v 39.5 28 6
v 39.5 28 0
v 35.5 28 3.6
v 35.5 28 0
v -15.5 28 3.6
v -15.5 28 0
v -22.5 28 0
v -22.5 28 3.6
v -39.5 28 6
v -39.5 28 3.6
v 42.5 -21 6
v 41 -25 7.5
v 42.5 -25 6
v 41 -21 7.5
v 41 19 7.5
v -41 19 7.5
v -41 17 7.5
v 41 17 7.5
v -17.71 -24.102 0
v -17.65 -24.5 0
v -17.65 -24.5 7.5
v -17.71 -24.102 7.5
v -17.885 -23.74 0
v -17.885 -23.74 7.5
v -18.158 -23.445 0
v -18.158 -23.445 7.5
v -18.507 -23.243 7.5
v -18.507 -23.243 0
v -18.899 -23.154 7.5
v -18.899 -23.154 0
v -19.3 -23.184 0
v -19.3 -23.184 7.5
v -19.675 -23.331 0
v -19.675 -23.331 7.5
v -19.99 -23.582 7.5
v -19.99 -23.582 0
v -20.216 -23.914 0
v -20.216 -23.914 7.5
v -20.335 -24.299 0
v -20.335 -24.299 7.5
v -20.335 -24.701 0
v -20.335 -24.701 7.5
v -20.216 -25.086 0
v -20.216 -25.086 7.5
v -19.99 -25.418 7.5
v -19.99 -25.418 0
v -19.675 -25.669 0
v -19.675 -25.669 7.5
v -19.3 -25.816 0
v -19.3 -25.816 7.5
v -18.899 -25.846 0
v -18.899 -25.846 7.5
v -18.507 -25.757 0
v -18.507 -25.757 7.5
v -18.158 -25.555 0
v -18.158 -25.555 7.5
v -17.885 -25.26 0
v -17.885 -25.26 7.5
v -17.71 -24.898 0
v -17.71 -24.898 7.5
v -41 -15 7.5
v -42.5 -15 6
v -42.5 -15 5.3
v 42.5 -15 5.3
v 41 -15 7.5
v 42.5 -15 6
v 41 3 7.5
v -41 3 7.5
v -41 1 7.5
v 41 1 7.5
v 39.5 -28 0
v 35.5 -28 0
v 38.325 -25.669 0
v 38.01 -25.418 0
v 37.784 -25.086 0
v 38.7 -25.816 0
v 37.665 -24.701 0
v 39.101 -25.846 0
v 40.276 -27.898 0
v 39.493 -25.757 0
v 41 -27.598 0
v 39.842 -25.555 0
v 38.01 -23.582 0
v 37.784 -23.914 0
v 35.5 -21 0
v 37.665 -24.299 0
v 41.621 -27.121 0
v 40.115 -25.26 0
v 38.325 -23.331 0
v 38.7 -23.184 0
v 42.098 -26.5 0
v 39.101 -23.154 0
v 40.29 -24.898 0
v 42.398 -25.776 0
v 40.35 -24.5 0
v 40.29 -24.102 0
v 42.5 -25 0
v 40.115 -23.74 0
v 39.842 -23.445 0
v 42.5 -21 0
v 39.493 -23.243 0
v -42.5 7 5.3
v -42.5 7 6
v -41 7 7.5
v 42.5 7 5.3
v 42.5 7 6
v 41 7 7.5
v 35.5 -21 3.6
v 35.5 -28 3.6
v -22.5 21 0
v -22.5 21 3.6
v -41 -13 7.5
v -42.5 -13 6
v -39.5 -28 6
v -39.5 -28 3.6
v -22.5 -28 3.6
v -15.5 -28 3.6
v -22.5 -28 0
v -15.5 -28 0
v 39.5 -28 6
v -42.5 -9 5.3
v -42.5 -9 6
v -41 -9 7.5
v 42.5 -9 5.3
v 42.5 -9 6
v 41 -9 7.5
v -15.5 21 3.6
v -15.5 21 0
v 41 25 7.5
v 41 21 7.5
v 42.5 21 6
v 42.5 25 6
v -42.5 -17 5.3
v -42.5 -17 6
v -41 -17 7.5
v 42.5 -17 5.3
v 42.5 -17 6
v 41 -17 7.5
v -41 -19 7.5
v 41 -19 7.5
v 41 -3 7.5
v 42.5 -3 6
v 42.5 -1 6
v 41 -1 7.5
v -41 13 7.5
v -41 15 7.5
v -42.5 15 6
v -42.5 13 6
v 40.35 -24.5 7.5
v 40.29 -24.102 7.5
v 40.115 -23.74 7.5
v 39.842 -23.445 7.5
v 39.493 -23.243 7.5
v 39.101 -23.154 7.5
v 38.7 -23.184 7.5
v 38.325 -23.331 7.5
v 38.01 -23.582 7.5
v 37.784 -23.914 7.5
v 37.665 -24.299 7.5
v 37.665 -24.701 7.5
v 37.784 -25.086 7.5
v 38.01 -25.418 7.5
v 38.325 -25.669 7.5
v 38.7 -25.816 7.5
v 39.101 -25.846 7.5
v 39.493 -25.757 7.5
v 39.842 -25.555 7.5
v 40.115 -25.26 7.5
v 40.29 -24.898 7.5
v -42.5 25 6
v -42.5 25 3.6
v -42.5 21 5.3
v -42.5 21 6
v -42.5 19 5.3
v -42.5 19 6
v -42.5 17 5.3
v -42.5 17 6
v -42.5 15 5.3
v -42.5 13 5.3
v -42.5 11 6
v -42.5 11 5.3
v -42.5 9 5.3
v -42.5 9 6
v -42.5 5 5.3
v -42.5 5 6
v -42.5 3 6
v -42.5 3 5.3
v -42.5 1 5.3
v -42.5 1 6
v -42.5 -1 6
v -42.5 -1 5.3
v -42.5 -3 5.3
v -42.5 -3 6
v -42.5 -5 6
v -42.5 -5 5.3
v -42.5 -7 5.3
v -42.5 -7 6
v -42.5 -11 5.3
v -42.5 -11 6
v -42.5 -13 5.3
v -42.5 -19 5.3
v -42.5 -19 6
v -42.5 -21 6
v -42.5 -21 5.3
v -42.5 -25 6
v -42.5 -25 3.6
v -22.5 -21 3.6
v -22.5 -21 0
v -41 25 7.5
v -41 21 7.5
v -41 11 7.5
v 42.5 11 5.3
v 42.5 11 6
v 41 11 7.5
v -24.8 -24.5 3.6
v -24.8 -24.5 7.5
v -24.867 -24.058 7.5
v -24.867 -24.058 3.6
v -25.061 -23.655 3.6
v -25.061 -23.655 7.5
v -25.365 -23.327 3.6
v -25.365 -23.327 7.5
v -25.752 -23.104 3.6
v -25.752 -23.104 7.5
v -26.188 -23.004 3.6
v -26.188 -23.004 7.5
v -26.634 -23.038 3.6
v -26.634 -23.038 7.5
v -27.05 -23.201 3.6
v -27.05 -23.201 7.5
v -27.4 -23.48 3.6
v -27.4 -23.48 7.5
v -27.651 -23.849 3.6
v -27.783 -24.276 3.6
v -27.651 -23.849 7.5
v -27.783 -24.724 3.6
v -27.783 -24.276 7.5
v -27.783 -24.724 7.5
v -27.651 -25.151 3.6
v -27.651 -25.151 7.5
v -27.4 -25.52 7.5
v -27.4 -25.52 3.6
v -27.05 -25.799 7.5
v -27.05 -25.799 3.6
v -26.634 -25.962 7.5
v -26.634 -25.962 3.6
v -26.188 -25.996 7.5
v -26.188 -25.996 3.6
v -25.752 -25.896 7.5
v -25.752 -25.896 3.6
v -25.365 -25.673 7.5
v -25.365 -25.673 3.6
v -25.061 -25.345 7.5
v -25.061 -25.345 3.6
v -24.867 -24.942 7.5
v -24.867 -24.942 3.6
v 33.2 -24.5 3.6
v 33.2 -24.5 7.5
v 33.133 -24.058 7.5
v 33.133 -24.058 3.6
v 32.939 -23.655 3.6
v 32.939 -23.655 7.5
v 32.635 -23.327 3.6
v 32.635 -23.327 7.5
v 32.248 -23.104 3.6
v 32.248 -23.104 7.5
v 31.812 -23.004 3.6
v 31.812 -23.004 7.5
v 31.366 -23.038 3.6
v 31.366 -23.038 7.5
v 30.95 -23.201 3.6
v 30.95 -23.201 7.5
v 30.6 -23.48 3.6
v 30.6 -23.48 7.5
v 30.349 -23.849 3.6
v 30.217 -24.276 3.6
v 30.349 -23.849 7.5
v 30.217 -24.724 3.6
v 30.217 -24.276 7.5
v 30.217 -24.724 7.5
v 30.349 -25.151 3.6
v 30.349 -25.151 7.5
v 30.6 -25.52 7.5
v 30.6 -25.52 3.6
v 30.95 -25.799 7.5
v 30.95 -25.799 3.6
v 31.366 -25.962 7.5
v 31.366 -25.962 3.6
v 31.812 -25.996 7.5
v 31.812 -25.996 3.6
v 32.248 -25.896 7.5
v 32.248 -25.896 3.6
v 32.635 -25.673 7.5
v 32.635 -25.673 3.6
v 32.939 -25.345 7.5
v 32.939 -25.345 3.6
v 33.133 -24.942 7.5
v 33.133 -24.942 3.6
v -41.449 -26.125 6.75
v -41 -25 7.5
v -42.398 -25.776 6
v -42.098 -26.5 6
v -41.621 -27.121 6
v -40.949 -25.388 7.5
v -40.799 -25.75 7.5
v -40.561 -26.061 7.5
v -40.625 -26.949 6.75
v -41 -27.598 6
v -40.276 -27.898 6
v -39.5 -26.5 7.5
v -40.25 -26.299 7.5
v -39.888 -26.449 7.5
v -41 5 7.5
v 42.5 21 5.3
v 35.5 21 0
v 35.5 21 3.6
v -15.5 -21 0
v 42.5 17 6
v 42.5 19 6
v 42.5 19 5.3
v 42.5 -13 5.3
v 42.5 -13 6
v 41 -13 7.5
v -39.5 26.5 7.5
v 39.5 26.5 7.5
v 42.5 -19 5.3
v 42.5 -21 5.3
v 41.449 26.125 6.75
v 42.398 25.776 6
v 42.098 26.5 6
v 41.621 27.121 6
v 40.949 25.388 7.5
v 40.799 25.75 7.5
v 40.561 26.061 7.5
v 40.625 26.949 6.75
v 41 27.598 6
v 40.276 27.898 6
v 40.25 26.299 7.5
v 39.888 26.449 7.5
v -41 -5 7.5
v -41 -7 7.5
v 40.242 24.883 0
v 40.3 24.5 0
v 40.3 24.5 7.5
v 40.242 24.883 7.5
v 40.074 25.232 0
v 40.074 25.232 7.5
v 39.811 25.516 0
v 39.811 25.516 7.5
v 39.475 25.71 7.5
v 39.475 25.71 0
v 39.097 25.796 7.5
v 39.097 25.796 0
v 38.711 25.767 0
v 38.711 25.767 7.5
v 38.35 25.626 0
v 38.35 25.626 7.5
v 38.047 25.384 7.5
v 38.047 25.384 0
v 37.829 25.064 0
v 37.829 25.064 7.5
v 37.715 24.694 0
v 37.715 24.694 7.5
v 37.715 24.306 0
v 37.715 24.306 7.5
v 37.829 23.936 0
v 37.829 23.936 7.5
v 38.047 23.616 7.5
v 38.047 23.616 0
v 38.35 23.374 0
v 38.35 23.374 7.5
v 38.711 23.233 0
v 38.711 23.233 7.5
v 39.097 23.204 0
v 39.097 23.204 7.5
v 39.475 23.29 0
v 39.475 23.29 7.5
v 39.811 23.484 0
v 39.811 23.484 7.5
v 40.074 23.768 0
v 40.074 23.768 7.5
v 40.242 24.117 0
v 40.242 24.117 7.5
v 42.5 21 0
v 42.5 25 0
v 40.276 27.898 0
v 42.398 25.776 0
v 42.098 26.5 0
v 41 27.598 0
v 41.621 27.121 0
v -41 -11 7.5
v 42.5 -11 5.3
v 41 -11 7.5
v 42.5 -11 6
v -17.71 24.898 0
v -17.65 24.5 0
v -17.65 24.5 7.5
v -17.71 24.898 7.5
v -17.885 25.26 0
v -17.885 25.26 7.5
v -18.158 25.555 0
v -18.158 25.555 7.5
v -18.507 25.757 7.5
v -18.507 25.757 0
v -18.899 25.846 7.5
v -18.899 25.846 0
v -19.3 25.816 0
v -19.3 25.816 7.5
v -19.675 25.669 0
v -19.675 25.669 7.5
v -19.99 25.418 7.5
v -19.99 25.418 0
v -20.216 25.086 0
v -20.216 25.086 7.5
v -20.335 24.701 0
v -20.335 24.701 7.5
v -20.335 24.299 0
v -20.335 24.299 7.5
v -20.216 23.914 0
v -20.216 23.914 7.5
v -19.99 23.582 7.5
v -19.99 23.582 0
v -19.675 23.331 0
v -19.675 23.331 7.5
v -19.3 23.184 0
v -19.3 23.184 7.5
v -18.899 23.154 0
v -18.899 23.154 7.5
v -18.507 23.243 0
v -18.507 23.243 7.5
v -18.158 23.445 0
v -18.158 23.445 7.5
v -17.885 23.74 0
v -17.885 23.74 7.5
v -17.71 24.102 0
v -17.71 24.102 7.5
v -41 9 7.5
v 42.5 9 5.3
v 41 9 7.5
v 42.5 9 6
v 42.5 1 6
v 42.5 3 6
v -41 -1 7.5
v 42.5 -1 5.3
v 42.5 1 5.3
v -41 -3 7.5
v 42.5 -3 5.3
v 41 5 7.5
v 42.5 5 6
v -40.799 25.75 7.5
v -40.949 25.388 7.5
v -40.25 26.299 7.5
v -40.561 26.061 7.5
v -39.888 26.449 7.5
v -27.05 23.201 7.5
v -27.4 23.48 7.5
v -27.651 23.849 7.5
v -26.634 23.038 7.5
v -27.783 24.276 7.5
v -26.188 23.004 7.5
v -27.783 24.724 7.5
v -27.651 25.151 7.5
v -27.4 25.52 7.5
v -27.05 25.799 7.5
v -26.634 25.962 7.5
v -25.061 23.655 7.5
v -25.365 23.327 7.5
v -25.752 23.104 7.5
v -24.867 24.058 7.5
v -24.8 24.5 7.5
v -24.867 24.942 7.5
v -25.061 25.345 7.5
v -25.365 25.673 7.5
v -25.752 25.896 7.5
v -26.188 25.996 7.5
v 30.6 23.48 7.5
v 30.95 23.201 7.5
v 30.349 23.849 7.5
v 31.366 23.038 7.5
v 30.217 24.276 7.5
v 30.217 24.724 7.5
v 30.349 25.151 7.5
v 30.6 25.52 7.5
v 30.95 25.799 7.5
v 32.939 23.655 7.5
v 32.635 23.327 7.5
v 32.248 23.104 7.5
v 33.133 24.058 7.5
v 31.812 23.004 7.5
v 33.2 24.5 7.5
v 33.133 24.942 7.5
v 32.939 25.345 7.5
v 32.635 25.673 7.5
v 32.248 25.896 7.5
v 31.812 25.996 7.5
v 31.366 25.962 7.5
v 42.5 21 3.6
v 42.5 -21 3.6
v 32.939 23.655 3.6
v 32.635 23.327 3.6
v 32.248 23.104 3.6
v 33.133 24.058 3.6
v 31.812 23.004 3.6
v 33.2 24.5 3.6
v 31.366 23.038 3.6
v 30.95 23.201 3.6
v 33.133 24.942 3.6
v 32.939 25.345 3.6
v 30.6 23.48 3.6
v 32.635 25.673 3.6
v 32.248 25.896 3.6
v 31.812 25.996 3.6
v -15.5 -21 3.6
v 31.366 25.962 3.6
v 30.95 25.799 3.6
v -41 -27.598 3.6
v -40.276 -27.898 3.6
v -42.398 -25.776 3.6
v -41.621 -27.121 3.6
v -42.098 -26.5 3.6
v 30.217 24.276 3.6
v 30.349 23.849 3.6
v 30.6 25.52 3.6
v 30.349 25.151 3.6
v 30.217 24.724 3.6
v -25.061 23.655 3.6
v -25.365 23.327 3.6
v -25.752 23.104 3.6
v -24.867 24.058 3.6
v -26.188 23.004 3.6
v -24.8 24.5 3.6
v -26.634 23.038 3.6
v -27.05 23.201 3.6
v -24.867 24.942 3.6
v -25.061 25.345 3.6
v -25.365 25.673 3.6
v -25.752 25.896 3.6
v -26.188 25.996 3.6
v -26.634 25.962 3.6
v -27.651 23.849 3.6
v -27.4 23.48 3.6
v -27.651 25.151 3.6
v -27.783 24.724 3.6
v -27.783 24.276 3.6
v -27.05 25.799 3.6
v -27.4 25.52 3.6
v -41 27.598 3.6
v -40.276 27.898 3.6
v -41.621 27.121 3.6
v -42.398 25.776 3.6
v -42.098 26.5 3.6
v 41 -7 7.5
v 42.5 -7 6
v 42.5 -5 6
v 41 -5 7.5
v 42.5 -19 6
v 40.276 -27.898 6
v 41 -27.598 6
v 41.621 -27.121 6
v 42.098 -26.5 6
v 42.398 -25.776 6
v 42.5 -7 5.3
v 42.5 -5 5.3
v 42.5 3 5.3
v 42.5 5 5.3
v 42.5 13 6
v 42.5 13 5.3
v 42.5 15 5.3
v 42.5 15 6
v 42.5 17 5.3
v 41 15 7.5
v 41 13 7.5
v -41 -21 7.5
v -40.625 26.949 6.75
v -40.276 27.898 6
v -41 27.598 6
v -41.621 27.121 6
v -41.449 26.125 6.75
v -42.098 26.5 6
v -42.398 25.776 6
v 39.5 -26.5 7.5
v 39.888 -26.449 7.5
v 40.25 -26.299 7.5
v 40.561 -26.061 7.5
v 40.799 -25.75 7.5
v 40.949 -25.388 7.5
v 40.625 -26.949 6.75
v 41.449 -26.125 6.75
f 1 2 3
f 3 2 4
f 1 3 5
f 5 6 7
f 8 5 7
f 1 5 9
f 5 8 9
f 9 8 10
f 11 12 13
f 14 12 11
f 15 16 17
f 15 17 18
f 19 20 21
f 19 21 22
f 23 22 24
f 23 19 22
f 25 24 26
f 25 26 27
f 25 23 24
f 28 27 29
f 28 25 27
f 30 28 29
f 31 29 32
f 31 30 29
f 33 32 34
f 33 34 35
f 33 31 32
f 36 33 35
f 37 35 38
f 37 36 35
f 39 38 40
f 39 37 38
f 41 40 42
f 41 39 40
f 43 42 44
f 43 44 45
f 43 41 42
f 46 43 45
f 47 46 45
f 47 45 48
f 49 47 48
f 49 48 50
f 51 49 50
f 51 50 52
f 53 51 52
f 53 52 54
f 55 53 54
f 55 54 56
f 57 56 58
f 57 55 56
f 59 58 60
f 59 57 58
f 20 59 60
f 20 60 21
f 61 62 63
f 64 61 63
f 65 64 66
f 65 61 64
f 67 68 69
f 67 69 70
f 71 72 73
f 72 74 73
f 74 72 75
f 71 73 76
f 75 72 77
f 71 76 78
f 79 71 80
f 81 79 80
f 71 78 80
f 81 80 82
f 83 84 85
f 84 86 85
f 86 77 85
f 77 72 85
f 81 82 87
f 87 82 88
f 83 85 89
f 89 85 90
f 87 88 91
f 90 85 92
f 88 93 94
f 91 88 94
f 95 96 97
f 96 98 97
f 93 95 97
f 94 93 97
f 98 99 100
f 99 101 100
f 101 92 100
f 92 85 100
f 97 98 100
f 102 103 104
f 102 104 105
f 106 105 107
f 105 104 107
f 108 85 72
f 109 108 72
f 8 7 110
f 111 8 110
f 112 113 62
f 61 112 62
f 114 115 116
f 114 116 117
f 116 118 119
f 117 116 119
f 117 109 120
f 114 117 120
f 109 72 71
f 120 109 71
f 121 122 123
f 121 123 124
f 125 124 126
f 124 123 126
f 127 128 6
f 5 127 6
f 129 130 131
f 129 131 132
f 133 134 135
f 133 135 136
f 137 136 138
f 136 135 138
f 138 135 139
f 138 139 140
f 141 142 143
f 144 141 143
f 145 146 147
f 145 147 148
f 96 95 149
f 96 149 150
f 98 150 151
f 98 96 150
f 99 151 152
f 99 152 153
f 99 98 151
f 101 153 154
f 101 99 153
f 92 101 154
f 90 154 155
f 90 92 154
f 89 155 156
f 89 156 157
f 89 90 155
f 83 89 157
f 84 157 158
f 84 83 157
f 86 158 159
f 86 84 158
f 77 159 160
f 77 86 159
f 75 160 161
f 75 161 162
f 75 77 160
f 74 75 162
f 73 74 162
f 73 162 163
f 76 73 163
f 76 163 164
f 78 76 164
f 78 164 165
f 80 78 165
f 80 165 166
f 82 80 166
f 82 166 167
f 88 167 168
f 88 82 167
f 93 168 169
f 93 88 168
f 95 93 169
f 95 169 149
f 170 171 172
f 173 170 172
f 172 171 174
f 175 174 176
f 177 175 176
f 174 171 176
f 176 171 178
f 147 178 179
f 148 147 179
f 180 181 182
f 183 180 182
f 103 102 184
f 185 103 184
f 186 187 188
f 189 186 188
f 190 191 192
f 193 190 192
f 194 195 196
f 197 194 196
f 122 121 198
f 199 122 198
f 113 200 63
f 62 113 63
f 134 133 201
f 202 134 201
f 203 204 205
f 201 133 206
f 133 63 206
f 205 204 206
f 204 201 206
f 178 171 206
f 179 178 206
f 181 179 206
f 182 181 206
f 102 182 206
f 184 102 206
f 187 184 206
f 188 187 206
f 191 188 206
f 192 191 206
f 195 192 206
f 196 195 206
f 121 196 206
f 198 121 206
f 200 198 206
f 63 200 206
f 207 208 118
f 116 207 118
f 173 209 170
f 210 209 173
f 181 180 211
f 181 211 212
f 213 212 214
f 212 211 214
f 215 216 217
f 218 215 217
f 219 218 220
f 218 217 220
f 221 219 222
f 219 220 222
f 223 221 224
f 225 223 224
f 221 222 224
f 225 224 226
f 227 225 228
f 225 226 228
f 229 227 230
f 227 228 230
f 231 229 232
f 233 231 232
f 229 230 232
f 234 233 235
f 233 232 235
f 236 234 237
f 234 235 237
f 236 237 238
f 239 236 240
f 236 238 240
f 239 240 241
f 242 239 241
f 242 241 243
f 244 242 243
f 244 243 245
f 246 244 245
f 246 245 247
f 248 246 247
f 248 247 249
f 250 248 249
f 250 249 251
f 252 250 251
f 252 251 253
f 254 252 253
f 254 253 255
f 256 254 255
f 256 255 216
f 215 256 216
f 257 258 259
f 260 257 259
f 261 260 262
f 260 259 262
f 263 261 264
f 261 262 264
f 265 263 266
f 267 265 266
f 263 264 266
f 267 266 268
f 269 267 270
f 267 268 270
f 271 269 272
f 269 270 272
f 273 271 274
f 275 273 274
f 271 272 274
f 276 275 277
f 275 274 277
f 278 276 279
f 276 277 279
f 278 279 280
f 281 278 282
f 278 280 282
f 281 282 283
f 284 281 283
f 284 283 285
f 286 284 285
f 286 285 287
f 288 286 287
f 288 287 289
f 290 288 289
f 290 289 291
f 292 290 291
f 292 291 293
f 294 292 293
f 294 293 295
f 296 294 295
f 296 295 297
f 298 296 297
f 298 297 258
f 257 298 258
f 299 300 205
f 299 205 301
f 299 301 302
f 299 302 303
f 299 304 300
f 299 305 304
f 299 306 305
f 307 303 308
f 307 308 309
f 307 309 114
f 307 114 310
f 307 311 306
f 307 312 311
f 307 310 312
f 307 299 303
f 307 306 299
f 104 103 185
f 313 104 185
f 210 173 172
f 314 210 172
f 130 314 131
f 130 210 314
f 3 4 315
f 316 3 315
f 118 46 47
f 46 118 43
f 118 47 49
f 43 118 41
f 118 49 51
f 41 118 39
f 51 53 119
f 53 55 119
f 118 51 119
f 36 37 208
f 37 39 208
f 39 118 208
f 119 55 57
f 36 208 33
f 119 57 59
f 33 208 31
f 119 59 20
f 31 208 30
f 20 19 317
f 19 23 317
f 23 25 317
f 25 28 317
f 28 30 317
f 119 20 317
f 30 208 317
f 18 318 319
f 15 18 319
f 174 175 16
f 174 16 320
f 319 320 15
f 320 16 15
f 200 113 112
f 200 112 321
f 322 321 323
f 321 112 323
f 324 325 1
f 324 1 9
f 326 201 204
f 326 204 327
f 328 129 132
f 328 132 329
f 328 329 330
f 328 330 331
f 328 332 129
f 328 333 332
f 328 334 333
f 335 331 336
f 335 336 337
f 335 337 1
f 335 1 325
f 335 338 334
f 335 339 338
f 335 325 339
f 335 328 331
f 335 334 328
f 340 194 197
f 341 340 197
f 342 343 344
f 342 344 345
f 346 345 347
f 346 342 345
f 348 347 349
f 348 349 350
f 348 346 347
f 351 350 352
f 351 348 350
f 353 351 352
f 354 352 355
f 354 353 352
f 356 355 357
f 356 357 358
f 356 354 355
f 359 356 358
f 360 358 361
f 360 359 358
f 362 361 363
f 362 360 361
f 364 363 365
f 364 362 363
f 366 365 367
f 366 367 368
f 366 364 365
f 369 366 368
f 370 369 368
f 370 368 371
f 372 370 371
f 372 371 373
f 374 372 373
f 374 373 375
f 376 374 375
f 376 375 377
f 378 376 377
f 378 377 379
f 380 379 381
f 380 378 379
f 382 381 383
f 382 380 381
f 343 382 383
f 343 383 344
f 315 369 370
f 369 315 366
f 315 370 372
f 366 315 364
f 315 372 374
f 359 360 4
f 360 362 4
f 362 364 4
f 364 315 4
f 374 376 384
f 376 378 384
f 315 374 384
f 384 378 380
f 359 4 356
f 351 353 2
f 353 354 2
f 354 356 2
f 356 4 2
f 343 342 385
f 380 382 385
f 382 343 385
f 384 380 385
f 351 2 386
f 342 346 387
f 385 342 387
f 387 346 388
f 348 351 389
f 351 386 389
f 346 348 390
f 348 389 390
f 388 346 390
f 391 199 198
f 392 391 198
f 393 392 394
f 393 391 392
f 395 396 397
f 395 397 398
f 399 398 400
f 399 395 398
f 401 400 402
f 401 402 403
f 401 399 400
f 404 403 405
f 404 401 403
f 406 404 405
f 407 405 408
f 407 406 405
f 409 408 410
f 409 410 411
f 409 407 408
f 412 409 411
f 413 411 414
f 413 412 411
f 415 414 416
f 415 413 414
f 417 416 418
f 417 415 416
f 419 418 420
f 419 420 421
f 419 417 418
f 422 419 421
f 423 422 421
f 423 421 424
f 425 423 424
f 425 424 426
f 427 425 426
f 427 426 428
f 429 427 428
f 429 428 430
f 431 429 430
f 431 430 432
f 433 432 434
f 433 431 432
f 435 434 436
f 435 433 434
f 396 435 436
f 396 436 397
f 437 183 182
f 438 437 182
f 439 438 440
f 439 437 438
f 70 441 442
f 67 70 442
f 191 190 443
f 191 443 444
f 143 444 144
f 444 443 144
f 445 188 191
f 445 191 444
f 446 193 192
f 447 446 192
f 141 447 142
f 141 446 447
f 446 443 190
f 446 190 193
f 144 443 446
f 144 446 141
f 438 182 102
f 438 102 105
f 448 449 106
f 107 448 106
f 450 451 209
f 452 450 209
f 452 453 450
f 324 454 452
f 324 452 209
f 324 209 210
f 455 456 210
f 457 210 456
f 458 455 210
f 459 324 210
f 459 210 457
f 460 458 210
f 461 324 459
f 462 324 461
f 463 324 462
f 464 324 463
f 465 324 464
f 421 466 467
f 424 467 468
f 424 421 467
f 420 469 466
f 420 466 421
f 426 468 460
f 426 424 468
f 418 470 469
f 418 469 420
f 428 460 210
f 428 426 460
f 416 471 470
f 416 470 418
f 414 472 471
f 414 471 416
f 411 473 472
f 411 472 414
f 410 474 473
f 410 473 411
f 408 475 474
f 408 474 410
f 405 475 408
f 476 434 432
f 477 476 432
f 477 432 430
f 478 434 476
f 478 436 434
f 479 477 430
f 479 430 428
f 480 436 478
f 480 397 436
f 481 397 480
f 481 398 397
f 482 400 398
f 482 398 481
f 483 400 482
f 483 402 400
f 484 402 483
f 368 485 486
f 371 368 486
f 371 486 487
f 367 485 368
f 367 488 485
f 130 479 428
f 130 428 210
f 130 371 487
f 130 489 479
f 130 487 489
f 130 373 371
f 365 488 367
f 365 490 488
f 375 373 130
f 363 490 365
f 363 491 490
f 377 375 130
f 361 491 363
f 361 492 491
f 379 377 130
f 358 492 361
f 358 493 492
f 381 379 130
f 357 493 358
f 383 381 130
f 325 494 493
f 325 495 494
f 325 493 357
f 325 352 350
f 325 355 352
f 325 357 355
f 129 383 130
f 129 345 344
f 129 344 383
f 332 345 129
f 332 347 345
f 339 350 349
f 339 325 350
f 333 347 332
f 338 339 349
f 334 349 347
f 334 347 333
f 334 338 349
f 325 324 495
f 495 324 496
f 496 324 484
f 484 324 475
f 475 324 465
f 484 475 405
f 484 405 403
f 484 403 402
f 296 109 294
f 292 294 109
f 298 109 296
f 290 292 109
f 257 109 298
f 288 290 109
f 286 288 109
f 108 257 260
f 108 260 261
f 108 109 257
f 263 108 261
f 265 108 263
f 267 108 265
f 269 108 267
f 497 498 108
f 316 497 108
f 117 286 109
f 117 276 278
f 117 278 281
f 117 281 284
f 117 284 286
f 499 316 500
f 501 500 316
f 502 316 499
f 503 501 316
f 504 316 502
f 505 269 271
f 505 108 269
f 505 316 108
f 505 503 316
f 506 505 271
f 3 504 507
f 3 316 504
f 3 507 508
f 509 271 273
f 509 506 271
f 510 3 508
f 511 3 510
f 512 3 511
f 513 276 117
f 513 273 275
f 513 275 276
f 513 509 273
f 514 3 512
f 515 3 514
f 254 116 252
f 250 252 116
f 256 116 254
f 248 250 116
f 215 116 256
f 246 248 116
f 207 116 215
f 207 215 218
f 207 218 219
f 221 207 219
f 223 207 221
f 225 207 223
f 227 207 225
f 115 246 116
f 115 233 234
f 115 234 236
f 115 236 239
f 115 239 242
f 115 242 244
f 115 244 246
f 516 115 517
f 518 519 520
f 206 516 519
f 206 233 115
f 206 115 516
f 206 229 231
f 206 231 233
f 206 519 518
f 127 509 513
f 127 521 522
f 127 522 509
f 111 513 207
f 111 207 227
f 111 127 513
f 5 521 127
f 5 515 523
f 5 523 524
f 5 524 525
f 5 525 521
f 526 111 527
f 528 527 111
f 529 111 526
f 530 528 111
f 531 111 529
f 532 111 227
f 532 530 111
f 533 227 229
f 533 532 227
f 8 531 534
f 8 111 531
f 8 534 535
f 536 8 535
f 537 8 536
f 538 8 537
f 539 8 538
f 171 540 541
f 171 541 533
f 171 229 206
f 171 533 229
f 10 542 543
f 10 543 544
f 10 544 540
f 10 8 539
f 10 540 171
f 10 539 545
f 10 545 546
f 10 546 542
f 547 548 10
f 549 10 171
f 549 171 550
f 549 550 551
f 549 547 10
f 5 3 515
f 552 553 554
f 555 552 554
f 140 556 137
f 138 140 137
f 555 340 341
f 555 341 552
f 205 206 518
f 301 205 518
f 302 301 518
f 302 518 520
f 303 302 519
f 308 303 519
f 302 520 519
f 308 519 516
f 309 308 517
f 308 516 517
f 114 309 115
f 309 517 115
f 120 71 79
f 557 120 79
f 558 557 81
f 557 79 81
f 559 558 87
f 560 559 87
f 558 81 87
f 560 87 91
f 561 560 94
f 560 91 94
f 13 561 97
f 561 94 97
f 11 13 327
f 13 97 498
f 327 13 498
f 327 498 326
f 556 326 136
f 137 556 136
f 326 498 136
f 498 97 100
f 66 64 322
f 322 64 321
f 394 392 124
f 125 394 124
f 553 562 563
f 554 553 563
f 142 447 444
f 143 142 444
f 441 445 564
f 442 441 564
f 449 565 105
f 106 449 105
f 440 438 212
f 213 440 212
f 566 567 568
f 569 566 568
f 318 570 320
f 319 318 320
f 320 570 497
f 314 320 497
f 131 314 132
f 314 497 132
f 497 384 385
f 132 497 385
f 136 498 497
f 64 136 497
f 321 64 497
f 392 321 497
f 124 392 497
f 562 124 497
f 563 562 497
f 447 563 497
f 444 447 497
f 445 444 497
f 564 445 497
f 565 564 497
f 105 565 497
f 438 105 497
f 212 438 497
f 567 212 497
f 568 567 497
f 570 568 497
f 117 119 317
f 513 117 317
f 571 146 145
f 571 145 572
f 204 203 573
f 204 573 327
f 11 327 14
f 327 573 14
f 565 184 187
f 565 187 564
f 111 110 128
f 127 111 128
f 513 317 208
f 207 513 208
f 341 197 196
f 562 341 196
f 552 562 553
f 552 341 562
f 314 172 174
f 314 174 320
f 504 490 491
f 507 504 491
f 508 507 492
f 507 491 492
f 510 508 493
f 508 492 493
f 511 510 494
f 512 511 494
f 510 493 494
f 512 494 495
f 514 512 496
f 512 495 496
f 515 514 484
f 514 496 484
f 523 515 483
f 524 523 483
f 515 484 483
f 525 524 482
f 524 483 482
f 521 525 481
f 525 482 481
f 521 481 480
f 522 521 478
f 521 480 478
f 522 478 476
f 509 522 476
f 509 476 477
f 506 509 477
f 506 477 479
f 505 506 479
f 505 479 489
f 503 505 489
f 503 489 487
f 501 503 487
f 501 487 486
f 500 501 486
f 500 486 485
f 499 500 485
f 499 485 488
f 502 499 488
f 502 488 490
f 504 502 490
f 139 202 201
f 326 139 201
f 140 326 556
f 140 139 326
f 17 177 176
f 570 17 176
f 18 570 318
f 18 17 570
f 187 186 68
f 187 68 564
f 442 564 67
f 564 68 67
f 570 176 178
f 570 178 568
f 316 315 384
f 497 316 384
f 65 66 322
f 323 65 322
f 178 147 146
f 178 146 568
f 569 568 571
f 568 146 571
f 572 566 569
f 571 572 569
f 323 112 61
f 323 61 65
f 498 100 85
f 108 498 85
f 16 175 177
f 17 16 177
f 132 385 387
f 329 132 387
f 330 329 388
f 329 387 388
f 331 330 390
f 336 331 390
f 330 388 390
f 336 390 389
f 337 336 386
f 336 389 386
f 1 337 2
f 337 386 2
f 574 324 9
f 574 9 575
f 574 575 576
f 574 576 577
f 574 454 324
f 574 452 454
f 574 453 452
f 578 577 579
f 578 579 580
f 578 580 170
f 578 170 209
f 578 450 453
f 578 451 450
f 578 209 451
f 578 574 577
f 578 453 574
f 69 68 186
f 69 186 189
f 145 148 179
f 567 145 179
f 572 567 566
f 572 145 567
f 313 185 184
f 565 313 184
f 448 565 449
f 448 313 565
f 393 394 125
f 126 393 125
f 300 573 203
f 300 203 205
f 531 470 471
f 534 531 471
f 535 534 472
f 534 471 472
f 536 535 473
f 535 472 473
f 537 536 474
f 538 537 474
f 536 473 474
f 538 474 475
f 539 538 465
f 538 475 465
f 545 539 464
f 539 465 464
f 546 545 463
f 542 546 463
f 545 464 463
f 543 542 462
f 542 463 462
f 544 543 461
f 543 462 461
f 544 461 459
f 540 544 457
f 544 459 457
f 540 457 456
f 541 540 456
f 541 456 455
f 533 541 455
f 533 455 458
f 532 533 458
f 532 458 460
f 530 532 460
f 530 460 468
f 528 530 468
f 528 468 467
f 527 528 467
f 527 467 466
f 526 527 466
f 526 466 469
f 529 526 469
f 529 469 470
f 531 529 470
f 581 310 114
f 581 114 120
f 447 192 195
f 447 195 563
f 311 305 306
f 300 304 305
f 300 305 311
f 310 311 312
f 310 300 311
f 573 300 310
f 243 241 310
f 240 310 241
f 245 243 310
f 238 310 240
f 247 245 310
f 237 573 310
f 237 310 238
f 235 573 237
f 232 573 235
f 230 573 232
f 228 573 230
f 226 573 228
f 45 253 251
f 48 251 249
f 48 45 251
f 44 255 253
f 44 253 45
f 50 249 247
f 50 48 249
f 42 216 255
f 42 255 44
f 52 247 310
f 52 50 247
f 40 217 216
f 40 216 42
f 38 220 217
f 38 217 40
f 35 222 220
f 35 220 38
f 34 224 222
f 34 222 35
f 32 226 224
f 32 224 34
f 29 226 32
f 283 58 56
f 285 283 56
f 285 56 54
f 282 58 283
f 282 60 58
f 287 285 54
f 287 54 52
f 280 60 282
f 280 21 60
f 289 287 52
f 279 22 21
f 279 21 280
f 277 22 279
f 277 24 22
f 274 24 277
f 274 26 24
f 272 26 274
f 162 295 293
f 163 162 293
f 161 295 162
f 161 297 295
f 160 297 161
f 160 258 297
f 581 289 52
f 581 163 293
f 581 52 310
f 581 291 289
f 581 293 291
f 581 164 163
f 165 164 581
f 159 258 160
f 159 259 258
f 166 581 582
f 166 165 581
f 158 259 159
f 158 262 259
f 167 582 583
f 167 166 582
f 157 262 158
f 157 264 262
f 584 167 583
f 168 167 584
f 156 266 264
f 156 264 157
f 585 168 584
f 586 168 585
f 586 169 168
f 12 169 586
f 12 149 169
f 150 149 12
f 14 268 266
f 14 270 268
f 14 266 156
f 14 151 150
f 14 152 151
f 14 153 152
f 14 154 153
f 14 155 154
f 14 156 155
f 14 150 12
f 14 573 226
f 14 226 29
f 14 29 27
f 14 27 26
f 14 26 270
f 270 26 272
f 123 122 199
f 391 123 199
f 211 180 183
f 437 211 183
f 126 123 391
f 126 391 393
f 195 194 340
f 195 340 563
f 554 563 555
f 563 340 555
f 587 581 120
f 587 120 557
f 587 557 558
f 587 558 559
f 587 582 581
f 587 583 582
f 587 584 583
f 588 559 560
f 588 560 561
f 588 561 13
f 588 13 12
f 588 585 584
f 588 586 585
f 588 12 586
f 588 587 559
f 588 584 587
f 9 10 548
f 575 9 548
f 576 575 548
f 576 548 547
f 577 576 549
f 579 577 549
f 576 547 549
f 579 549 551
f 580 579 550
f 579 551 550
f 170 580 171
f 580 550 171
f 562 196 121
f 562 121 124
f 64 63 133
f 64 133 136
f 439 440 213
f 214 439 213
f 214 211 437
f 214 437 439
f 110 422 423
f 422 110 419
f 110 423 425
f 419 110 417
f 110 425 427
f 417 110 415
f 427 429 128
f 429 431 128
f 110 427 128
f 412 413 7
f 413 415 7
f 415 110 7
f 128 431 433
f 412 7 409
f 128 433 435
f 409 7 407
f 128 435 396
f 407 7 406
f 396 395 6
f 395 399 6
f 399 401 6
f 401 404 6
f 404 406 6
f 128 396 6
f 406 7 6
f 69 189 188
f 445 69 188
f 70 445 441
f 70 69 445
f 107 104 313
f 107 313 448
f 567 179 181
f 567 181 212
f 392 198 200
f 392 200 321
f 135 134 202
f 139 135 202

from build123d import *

# Parameters (mm, degrees)
SKETCH1_R           = 1.35
SKETCH1_R_2         = 1.3
BOSS_EXTRUDE1_DEPTH = 7.5
CUT_EXTRUDE1_DEPTH  = 3.6
CHAMFER1_SIZE       = 1.5
SKETCH3_W           = 85
SKETCH3_H           = 2
CUT_EXTRUDE2_DEPTH  = 2.2
CUT_EXTRUDE3_REACH  = 9.5
SKETCH4_R           = 1.5


with BuildPart() as part:
    # Sketch1 → Boss-Extrude1 (new body)
    with BuildSketch(Plane.XY):
        with BuildLine():
            Line((42.5, -25), (42.5, 25))
            ThreePointArc((42.5, 25), (41.621320344, 27.121320344), (39.5, 28))
            Line((39.5, 28), (-39.5, 28))
            ThreePointArc((-39.5, 28), (-41.621320344, 27.121320344), (-42.5, 25))
            Line((-42.5, 25), (-42.5, -25))
            ThreePointArc((-42.5, -25), (-41.621320344, -27.121320344), (-39.5, -28))
            Line((-39.5, -28), (39.5, -28))
            ThreePointArc((39.5, -28), (41.621320344, -27.121320344), (42.5, -25))
        make_face()
        with Locations((-19, -24.5)):
            Circle(SKETCH1_R, mode=Mode.SUBTRACT)
        with Locations((39, -24.5)):
            Circle(SKETCH1_R, mode=Mode.SUBTRACT)
        with Locations((39, 24.5)):
            Circle(SKETCH1_R_2, mode=Mode.SUBTRACT)
        with Locations((-19, 24.5)):
            Circle(SKETCH1_R, mode=Mode.SUBTRACT)
    extrude(amount=BOSS_EXTRUDE1_DEPTH)

    # Sketch2 → Cut-Extrude1 (cut)
    with BuildSketch(Plane(origin=(0, 0, 0), x_dir=(-1, 0, 0), z_dir=(0, 0, -1))):
        with BuildLine():
            Line((15.5, 28), (-35.5, 28))
            Line((-35.5, 28), (-35.5, 21))
            Line((-35.5, 21), (-42.5, 21))
            Line((-42.5, 21), (-42.5, -21))
            Line((-42.5, -21), (-35.5, -21))
            Line((-35.5, -21), (-35.5, -28))
            Line((-35.5, -28), (15.5, -28))
            Line((15.5, -28), (15.5, -21))
            Line((15.5, -21), (22.5, -21))
            Line((22.5, -21), (22.5, -28))
            Line((22.5, -28), (39.5, -28))
            ThreePointArc((39.5, -28), (41.621320344, -27.121320344), (42.5, -25))
            Line((42.5, -25), (42.5, 25))
            ThreePointArc((42.5, 25), (41.621320344, 27.121320344), (39.5, 28))
            Line((39.5, 28), (22.5, 28))
            Line((22.5, 28), (22.5, 21))
            Line((22.5, 21), (15.5, 21))
            Line((15.5, 21), (15.5, 28))
        make_face()
    extrude(amount=-CUT_EXTRUDE1_DEPTH, mode=Mode.SUBTRACT)

    # Chamfer1
    chamfer1_edges = [part.edges().sort_by_distance(p)[0] for p in [
        (41.621320344, 27.121320344, 7.5),
        (0, 28, 7.5),
        (-41.621320344, 27.121320344, 7.5),
        (-42.5, 0, 7.5),
        (-41.621320344, -27.121320344, 7.5),
        (0, -28, 7.5),
        (41.621320344, -27.121320344, 7.5),
        (42.5, 0, 7.5),
    ]]
    chamfer(chamfer1_edges, length=CHAMFER1_SIZE)

    # Sketch3 → Cut-Extrude2 (cut)
    with BuildSketch(Plane.XY.offset(7.5)):
        with Locations((0, 20)):
            Rectangle(SKETCH3_W, SKETCH3_H)
        with Locations((0, 16)):
            Rectangle(SKETCH3_W, SKETCH3_H)
        with Locations((0, 12)):
            Rectangle(SKETCH3_W, SKETCH3_H)
        with Locations((0, 8)):
            Rectangle(SKETCH3_W, SKETCH3_H)
        with Locations((0, 4)):
            Rectangle(SKETCH3_W, SKETCH3_H)
        Rectangle(SKETCH3_W, SKETCH3_H)
        with Locations((0, -4)):
            Rectangle(SKETCH3_W, SKETCH3_H)
        with Locations((0, -8)):
            Rectangle(SKETCH3_W, SKETCH3_H)
        with Locations((0, -12)):
            Rectangle(SKETCH3_W, SKETCH3_H)
        with Locations((0, -16)):
            Rectangle(SKETCH3_W, SKETCH3_H)
        with Locations((0, -20)):
            Rectangle(SKETCH3_W, SKETCH3_H)
    extrude(amount=-CUT_EXTRUDE2_DEPTH, mode=Mode.SUBTRACT)

    # Sketch4 → Cut-Extrude3 (cut, up to next)
    with BuildSketch(Plane.XY.offset(7.5), mode=Mode.PRIVATE) as cut_extrude3_sk1:
        with Locations((-26.3, 24.5)):
            Circle(SKETCH4_R)
    cut_extrude3_tool1 = extrude(cut_extrude3_sk1.sketch, amount=-CUT_EXTRUDE3_REACH, mode=Mode.PRIVATE) & part.part
    add(cut_extrude3_tool1.solids().sort_by_distance((-26.3, 24.5, 7.5))[0], mode=Mode.SUBTRACT)
    # Sketch4 → Cut-Extrude3 (cut, up to next)
    with BuildSketch(Plane.XY.offset(7.5), mode=Mode.PRIVATE) as cut_extrude3_sk2:
        with Locations((31.7, 24.5)):
            Circle(SKETCH4_R)
    cut_extrude3_tool2 = extrude(cut_extrude3_sk2.sketch, amount=-CUT_EXTRUDE3_REACH, mode=Mode.PRIVATE) & part.part
    add(cut_extrude3_tool2.solids().sort_by_distance((31.7, 24.5, 7.5))[0], mode=Mode.SUBTRACT)
    # Sketch4 → Cut-Extrude3 (cut, up to next)
    with BuildSketch(Plane.XY.offset(7.5), mode=Mode.PRIVATE) as cut_extrude3_sk3:
        with Locations((-26.3, -24.5)):
            Circle(SKETCH4_R)
    cut_extrude3_tool3 = extrude(cut_extrude3_sk3.sketch, amount=-CUT_EXTRUDE3_REACH, mode=Mode.PRIVATE) & part.part
    add(cut_extrude3_tool3.solids().sort_by_distance((-26.3, -24.5, 7.5))[0], mode=Mode.SUBTRACT)
    # Sketch4 → Cut-Extrude3 (cut, up to next)
    with BuildSketch(Plane.XY.offset(7.5), mode=Mode.PRIVATE) as cut_extrude3_sk4:
        with Locations((31.7, -24.5)):
            Circle(SKETCH4_R)
    cut_extrude3_tool4 = extrude(cut_extrude3_sk4.sketch, amount=-CUT_EXTRUDE3_REACH, mode=Mode.PRIVATE) & part.part
    add(cut_extrude3_tool4.solids().sort_by_distance((31.7, -24.5, 7.5))[0], mode=Mode.SUBTRACT)


solid = part.part
